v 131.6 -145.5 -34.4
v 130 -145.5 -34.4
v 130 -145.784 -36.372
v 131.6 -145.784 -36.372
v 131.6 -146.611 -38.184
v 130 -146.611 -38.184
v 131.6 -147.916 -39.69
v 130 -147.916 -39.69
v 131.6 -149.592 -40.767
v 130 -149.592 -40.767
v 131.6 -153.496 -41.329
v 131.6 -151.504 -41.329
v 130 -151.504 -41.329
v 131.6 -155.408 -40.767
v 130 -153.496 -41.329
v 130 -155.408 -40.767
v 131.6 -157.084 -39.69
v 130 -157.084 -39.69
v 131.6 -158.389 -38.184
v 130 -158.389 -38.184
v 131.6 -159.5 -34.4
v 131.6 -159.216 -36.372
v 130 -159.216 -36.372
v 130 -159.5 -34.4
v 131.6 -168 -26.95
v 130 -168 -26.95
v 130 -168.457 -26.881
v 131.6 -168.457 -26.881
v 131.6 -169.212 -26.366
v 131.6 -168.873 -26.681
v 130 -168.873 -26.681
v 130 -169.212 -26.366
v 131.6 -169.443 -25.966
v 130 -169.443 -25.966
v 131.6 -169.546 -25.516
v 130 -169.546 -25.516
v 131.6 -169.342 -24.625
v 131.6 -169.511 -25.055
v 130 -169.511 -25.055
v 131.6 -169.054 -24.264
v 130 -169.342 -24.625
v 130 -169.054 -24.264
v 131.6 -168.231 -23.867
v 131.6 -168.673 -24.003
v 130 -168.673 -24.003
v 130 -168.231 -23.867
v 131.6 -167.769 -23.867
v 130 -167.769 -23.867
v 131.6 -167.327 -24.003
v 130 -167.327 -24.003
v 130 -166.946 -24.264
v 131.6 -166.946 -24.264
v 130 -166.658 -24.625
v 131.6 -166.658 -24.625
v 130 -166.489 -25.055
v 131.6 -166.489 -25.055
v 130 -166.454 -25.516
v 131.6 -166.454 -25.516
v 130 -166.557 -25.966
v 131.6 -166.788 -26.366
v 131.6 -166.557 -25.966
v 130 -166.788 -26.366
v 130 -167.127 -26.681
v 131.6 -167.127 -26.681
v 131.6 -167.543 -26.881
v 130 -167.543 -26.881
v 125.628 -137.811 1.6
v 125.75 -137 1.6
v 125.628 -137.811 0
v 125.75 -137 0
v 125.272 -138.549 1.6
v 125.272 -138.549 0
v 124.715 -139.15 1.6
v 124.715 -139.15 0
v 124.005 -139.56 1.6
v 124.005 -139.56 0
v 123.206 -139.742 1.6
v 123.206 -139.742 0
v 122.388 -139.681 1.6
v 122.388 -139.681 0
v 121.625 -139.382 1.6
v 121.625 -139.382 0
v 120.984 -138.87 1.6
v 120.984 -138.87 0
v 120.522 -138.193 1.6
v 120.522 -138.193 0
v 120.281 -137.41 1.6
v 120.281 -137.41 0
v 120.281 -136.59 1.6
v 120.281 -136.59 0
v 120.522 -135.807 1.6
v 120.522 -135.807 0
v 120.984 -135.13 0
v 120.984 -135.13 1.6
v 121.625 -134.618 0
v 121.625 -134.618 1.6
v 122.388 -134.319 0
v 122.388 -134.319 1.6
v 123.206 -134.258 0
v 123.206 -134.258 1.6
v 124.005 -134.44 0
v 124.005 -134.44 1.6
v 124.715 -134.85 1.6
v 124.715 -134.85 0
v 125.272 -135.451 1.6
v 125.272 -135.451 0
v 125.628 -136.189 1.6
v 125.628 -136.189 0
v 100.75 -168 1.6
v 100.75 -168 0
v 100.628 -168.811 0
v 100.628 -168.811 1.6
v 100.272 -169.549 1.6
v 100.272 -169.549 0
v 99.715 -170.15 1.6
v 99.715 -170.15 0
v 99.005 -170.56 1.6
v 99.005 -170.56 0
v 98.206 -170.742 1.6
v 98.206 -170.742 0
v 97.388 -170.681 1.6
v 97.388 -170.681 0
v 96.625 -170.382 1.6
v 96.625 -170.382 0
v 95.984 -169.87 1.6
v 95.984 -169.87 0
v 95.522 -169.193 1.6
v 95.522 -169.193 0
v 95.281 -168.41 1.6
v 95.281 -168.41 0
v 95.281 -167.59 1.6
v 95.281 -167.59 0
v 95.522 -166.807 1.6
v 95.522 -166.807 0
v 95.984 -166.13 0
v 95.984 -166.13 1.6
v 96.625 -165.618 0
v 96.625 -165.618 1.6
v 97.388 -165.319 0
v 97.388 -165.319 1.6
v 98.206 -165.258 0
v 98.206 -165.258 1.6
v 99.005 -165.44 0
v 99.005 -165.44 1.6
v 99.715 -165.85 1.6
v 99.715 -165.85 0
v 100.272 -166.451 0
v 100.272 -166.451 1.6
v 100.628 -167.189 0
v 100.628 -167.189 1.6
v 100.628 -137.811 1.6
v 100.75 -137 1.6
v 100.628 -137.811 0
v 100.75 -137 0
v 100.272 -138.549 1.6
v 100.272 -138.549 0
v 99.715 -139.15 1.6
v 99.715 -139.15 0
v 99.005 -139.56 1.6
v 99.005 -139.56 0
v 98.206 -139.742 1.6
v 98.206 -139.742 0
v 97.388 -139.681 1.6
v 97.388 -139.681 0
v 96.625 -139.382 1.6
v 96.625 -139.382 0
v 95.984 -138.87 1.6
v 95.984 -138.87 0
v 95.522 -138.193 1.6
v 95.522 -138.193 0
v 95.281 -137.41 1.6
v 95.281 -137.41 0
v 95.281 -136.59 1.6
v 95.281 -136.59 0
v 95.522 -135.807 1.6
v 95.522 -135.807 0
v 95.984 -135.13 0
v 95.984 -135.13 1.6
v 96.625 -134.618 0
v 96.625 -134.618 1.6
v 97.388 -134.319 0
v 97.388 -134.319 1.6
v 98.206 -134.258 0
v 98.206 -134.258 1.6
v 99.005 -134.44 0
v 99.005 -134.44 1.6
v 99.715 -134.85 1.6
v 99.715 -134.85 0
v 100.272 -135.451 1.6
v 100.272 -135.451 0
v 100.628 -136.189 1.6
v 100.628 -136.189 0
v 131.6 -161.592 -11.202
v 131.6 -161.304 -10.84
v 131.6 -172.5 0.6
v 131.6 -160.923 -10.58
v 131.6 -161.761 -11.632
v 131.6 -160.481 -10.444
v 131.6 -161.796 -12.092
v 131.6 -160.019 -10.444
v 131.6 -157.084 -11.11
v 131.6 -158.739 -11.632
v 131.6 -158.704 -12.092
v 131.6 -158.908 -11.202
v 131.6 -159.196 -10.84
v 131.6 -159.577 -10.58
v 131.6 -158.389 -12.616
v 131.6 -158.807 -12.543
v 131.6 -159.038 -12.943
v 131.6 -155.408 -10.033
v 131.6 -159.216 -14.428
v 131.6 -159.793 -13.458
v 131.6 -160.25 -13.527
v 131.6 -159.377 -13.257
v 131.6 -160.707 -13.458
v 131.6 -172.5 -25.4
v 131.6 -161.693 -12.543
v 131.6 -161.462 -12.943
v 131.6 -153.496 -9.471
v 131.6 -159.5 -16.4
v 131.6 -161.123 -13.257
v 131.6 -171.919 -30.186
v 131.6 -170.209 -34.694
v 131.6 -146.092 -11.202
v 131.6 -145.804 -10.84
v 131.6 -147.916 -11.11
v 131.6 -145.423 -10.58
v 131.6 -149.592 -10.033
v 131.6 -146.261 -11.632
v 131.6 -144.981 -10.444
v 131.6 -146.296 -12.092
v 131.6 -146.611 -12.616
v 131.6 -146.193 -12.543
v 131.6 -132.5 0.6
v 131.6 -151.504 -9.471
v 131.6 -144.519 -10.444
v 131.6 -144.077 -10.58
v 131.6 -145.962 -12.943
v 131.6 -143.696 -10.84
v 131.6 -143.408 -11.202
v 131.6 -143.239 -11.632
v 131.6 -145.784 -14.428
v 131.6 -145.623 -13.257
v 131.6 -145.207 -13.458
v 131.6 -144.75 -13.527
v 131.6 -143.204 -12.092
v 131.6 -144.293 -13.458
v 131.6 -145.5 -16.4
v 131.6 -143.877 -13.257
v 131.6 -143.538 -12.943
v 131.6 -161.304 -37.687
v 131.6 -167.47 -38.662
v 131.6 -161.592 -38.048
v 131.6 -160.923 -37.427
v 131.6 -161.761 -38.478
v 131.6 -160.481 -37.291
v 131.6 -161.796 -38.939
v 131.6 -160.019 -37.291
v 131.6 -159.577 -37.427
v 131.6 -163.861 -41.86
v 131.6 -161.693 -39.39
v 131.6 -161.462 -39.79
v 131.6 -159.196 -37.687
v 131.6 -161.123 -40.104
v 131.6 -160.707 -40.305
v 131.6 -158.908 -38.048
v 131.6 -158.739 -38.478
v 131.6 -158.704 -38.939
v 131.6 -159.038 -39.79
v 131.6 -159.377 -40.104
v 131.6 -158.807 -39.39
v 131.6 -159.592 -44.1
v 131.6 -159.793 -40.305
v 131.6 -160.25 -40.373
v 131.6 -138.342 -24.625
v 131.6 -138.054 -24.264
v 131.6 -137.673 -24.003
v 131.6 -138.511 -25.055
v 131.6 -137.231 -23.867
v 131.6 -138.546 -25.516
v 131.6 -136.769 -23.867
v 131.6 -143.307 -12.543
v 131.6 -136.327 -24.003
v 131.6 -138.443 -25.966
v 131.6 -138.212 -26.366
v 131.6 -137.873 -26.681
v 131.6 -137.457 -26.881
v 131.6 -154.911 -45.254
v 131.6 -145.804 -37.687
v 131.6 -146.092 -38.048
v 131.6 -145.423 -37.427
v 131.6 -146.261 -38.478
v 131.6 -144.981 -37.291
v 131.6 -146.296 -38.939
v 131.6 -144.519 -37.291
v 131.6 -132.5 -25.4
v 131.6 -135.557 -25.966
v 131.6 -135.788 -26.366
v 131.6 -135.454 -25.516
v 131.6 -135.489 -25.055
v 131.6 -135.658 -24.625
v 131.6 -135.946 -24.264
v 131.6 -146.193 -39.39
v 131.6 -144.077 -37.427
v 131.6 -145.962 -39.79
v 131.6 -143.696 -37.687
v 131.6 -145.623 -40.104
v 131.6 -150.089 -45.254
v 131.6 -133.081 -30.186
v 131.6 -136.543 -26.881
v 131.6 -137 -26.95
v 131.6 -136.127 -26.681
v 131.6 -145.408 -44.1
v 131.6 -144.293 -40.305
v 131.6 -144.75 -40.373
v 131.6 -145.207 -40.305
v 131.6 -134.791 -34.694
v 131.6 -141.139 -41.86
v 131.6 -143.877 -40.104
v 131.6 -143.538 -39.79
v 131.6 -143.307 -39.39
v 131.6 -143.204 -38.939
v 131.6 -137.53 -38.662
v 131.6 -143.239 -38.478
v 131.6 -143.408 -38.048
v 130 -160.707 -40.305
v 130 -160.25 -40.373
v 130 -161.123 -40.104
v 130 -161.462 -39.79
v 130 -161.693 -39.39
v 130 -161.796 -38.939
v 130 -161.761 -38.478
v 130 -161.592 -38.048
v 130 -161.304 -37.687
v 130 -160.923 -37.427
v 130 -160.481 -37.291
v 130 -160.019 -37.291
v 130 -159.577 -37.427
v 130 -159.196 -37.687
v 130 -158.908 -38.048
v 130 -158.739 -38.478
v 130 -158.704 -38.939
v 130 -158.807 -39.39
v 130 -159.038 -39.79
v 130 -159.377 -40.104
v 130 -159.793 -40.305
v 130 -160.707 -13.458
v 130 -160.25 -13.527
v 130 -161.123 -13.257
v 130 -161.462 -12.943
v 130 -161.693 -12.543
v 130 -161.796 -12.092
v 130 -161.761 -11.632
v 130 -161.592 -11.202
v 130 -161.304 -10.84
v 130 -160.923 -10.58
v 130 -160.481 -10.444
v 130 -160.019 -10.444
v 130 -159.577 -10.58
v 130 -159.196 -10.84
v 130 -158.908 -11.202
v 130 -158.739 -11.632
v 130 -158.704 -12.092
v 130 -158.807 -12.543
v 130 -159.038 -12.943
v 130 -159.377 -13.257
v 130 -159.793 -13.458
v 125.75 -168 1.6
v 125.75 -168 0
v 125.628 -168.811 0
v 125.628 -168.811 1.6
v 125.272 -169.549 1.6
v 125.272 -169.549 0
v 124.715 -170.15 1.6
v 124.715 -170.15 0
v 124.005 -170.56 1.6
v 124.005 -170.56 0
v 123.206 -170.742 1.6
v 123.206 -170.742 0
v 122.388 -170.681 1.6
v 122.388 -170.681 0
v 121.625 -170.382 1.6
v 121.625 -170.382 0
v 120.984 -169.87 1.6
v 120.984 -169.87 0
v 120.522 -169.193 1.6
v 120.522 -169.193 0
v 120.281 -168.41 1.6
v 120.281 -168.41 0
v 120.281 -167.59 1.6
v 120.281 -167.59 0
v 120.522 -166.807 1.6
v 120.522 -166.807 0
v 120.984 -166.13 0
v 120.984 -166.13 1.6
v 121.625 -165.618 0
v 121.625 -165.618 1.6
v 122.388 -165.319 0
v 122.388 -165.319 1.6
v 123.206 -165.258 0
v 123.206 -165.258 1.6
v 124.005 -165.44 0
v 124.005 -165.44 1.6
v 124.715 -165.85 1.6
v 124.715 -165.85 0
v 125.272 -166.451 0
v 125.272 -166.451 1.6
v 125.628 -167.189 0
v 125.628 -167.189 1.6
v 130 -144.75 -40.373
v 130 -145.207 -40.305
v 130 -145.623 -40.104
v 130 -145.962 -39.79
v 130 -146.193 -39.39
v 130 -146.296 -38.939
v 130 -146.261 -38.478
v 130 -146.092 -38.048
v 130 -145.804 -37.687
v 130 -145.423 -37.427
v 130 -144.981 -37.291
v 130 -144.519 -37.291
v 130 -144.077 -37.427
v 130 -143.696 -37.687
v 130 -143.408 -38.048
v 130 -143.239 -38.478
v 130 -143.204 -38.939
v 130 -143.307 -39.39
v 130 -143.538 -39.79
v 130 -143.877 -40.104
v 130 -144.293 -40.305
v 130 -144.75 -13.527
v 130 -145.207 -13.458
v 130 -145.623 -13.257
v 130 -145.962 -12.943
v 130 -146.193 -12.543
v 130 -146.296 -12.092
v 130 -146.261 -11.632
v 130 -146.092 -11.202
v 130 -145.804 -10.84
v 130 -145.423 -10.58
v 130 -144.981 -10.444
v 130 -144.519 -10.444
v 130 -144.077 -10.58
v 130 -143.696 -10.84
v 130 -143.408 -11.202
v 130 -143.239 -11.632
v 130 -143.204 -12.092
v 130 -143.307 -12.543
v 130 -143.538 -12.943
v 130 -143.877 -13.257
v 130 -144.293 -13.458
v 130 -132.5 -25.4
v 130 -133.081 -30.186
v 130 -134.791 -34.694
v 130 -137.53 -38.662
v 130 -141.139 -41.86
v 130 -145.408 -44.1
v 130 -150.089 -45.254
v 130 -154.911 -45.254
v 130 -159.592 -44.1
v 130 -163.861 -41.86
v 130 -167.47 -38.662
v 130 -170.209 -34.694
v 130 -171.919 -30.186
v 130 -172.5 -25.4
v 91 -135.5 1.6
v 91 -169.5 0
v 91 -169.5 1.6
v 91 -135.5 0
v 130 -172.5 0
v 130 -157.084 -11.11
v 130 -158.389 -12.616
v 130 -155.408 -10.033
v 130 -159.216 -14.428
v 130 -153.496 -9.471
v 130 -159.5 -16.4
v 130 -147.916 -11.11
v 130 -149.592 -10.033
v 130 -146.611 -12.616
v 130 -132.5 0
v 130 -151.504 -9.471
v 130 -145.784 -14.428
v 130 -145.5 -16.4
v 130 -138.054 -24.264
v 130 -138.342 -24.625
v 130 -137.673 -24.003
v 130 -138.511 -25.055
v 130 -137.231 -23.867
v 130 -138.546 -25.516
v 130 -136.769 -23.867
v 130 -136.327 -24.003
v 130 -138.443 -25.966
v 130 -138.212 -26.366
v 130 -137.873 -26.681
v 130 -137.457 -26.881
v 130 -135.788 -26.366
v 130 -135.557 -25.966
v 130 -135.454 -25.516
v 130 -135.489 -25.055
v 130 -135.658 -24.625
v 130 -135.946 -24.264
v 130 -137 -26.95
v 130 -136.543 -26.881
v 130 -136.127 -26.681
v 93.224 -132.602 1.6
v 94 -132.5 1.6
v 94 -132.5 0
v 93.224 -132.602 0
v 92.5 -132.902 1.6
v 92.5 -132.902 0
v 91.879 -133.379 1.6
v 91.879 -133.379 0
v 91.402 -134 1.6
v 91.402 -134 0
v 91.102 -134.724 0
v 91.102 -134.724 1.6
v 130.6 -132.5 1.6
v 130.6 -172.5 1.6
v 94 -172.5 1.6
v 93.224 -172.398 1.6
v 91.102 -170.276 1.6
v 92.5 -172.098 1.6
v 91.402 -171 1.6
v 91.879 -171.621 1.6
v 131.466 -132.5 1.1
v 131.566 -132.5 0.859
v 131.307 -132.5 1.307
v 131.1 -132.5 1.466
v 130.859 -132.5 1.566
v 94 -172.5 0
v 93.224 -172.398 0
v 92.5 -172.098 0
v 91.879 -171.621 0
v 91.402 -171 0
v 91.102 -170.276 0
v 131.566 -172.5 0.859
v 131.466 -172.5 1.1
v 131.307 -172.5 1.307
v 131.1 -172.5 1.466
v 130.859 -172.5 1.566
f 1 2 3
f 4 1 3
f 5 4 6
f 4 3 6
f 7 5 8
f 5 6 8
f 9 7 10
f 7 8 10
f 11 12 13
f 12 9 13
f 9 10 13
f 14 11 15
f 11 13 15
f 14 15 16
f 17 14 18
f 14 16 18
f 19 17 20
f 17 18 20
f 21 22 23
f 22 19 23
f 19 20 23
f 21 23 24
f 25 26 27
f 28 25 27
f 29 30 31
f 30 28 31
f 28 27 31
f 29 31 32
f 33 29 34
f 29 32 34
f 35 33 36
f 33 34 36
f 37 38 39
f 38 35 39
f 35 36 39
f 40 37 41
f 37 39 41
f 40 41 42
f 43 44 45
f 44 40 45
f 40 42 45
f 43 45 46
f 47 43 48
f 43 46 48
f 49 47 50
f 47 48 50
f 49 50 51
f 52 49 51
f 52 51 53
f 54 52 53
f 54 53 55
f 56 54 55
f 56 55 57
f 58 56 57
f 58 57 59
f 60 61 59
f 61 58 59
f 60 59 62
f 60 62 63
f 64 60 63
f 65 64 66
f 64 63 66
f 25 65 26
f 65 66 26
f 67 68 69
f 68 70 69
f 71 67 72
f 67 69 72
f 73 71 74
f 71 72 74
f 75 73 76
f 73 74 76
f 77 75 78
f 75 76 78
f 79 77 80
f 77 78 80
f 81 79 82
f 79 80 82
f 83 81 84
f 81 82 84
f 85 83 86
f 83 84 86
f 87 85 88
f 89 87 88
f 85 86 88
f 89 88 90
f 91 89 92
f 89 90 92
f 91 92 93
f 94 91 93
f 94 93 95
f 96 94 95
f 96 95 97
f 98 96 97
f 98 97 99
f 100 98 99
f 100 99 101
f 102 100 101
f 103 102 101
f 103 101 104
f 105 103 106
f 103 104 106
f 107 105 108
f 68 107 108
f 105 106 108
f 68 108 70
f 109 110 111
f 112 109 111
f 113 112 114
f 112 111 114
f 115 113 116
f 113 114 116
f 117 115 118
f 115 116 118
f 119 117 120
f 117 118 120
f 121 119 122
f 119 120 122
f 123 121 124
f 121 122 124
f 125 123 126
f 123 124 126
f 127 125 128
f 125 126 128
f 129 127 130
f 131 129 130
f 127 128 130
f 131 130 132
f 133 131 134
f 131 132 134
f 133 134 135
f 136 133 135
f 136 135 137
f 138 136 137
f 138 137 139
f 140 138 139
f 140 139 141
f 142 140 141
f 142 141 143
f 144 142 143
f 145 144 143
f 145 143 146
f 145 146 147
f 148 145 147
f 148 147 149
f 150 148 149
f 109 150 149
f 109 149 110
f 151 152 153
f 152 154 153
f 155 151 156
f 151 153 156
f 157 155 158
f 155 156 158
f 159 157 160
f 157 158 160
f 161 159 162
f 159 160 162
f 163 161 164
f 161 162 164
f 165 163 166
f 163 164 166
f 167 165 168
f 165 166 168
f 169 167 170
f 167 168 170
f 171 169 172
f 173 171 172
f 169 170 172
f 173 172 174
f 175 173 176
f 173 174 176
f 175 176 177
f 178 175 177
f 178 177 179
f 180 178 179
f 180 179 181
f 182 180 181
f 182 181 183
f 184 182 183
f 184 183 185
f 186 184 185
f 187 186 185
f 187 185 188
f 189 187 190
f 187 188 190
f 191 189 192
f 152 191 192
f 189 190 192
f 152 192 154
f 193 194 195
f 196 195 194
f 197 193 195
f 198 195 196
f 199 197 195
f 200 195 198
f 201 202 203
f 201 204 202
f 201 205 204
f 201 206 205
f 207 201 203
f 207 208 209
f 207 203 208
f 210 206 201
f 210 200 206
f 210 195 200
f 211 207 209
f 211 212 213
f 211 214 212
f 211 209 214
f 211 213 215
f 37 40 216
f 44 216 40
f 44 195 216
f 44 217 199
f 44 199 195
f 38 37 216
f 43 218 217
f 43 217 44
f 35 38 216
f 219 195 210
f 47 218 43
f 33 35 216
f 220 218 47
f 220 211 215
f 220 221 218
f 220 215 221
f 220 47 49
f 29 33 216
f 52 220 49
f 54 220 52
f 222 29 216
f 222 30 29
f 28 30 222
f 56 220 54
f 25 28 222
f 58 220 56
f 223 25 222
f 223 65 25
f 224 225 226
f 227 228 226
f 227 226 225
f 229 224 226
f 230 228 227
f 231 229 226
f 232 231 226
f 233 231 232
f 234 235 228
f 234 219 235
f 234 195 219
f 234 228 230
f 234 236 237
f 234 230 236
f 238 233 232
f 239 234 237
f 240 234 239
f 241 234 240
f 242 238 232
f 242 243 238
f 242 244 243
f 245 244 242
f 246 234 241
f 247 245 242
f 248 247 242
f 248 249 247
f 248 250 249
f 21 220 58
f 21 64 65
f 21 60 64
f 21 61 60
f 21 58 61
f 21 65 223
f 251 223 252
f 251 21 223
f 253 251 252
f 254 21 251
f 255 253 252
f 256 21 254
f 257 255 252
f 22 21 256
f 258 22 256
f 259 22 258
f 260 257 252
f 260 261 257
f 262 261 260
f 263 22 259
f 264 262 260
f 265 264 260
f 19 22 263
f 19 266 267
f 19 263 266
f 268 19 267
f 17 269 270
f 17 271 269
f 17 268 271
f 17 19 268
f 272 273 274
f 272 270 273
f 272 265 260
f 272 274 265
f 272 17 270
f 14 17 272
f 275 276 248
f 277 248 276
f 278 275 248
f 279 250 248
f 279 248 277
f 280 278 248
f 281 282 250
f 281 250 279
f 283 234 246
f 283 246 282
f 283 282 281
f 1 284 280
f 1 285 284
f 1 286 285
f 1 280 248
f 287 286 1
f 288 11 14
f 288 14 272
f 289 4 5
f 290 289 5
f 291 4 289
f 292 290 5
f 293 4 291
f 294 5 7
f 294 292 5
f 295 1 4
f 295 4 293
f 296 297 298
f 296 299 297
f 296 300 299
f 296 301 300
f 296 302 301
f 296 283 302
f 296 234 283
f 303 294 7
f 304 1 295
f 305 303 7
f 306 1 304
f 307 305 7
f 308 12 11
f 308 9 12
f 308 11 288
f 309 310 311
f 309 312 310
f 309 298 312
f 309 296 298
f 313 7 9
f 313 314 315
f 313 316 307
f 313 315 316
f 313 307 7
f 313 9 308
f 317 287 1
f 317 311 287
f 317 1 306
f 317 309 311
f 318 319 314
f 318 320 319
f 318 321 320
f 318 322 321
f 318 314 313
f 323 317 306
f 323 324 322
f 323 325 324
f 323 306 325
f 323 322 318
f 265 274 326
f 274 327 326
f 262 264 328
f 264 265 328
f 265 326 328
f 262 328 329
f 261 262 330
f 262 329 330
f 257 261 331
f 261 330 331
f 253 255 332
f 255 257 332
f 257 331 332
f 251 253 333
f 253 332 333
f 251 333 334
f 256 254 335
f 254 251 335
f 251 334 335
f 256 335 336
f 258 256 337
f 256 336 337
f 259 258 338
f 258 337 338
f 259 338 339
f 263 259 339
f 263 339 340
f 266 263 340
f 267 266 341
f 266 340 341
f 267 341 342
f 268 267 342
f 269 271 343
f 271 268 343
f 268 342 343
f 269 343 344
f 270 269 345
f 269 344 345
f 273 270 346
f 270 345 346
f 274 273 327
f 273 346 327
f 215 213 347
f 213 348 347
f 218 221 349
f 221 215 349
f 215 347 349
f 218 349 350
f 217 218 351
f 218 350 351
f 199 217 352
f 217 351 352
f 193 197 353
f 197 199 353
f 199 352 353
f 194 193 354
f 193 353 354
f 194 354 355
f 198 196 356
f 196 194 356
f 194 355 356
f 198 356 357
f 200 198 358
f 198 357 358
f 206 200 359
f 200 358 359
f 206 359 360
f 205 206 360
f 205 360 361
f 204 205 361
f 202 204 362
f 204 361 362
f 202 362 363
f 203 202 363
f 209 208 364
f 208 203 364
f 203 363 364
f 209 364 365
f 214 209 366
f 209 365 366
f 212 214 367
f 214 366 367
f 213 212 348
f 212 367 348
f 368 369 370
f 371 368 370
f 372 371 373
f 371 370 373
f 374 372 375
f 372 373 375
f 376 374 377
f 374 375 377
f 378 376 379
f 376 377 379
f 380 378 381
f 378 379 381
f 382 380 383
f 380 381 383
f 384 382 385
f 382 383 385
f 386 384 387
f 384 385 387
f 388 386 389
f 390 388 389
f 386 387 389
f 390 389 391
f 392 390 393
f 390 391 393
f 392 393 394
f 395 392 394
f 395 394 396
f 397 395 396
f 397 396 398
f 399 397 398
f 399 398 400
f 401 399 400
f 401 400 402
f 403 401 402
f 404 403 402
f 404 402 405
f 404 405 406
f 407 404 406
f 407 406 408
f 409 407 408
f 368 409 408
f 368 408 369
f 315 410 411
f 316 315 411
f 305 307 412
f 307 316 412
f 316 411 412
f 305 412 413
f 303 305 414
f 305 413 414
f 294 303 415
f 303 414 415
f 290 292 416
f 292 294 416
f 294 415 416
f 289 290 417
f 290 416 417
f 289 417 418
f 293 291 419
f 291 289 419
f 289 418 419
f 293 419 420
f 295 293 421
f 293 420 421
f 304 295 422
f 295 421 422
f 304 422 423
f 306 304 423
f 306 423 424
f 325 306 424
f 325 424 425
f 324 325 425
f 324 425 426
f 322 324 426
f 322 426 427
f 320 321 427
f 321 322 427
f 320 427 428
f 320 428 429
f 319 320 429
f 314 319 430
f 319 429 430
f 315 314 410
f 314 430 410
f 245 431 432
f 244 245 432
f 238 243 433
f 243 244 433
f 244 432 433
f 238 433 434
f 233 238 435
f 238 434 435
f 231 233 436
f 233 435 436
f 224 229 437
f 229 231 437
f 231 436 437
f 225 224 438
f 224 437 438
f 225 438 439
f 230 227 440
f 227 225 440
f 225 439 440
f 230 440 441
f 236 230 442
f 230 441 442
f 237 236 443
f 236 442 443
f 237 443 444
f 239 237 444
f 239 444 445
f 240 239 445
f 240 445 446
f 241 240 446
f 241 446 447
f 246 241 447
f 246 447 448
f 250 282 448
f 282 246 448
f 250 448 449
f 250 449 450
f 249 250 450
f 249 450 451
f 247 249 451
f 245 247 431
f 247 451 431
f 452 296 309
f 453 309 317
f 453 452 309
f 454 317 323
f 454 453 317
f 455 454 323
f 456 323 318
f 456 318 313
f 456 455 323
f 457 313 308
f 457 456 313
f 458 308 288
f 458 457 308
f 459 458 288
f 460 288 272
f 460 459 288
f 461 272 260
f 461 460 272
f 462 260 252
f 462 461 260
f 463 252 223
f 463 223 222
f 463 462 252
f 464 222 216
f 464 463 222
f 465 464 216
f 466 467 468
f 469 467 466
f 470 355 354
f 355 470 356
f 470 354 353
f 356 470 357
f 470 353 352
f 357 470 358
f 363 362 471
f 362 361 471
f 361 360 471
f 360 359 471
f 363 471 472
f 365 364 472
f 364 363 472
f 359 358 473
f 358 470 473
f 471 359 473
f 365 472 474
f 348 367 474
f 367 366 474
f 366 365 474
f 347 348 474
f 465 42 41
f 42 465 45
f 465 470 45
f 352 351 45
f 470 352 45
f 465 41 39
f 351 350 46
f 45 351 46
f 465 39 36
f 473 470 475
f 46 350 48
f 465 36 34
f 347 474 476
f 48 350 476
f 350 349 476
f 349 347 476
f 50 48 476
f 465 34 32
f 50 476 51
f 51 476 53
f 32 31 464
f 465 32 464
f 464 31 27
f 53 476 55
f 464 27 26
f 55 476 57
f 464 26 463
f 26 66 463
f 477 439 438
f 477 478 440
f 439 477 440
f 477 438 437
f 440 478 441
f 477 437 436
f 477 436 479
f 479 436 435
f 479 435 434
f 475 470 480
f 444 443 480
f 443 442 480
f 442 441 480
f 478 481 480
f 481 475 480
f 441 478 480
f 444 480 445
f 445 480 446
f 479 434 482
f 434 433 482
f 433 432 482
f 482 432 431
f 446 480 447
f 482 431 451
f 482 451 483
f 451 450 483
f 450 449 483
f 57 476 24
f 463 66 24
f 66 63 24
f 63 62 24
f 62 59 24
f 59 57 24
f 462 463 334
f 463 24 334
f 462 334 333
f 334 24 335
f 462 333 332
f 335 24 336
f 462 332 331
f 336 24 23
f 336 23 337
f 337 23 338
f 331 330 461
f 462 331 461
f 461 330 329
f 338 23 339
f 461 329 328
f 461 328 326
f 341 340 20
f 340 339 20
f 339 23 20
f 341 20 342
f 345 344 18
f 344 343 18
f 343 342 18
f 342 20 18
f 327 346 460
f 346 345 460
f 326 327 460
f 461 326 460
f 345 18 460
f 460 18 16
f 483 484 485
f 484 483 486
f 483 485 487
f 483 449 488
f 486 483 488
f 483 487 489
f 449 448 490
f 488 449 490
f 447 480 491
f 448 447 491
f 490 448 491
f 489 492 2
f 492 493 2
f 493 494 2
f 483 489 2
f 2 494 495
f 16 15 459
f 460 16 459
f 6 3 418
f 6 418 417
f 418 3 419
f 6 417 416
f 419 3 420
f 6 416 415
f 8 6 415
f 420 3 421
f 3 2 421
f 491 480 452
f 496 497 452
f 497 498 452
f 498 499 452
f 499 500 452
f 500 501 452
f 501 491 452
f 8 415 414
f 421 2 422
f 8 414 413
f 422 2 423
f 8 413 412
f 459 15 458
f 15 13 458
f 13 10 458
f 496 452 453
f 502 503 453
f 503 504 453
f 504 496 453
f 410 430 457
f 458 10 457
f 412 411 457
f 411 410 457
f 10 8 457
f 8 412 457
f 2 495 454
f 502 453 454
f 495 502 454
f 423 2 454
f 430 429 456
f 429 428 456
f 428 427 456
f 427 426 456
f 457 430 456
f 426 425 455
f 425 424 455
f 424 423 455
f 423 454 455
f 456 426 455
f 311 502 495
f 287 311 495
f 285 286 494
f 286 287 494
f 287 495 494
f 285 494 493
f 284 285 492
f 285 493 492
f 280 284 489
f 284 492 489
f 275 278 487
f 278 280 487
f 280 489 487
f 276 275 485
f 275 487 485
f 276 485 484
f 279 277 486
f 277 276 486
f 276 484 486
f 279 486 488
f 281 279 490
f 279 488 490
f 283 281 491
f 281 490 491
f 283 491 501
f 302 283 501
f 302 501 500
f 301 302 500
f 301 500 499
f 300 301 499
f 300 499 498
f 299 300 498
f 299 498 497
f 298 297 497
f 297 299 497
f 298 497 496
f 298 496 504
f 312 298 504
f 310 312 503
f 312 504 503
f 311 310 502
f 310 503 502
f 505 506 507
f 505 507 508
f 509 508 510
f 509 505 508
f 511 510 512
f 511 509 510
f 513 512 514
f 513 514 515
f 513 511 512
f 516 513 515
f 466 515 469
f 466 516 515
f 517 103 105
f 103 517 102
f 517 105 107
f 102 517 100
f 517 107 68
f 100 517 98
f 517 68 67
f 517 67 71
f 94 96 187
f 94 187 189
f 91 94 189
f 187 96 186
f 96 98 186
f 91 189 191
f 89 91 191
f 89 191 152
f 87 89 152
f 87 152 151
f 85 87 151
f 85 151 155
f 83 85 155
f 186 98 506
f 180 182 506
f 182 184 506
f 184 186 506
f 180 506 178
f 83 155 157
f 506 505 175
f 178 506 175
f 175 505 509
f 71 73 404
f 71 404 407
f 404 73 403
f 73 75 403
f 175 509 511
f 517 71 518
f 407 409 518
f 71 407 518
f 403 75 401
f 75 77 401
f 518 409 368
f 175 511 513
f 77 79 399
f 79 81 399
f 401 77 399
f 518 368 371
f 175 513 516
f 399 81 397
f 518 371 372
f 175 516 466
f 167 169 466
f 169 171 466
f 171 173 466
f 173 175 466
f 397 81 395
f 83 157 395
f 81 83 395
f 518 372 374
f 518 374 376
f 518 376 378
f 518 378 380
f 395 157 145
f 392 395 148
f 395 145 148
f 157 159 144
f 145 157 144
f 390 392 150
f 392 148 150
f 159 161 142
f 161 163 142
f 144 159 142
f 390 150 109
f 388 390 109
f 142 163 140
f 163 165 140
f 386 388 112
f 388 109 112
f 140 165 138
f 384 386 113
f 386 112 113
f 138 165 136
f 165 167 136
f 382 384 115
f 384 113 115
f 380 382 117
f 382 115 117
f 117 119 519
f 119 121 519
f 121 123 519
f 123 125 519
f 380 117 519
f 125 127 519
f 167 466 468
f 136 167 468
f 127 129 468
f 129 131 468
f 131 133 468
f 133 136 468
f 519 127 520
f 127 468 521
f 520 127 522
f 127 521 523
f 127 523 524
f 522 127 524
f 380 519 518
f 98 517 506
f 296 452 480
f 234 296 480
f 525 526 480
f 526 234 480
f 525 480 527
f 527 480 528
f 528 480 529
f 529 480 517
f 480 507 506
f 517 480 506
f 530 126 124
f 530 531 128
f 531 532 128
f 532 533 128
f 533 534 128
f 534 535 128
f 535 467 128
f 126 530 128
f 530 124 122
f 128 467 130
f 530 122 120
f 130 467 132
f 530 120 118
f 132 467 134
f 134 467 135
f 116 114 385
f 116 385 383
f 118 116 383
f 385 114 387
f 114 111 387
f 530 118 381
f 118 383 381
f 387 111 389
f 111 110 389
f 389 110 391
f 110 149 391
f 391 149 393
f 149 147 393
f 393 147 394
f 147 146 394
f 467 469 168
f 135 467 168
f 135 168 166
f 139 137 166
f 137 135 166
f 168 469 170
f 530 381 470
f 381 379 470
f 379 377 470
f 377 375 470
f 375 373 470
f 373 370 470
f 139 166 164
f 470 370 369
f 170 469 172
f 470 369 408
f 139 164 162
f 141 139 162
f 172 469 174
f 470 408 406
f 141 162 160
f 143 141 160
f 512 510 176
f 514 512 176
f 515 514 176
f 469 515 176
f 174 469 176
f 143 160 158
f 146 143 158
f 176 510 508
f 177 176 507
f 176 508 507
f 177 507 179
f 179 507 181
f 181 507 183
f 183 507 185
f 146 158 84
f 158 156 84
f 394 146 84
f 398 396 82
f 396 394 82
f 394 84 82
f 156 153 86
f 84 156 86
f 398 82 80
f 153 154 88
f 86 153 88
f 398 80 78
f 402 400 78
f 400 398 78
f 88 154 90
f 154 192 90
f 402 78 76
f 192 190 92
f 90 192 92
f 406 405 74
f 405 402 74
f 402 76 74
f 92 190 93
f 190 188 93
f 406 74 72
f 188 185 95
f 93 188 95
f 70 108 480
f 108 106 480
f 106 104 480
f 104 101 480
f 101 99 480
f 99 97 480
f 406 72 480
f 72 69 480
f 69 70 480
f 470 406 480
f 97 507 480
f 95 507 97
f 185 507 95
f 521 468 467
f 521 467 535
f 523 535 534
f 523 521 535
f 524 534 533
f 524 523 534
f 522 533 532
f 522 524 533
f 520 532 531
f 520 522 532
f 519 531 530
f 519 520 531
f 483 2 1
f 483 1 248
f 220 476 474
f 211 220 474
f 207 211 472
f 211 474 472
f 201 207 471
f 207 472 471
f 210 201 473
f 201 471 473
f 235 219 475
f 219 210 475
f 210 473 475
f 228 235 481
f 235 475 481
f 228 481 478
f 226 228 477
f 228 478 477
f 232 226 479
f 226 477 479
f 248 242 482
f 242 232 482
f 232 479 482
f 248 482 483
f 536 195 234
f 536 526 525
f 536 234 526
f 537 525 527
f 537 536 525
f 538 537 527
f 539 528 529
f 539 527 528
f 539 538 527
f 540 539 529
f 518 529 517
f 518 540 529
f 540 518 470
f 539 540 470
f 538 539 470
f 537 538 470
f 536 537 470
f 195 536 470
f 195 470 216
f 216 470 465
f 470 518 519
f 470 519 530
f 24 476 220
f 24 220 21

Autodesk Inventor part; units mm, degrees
ref_plane "YZ Plane" through (0, 0, 0) normal (1, 0, 0) x (0, 1, 0)
ref_plane "XZ Plane" through (0, 0, 0) normal (0, 1, 0) x (-1, 0, 0)
ref_plane "작업 평면1" through (0, 0, 0) normal (0, 0, 1) x (1, 0, 0)
sketch "스케치1" plane through (0, 0, 0) normal (0, 0, 1) x (1, 0, 0)
  line L0 (130, -172.5) -> (91, -172.5)
  line L1 (91, -172.5) -> (91, -132.5)
  line L2 (91, -132.5) -> (130, -132.5)
  line L3 (130, -132.5) -> (130, -172.5)
  line L4 (91, -152.5) -> (130, -152.5) construction
  circle A0 centre (98, -168) radius 2.75
  line L5 (110.5, -172.5) -> (110.5, -132.5) construction
  circle A1 centre (98, -137) radius 2.75
  circle A2 centre (123, -168) radius 2.75
  circle A3 centre (123, -137) radius 2.75
  circle A4 centre (0, 170) radius 2 projected
  circle A5 centre (-73.6122, 42.5) radius 2 projected
  circle A6 centre (73.6122, 42.5) radius 2 projected
  line L6 (-175, 220) -> (-175, 200) projected
  line L7 (-175, 200) -> (-130, 200) projected
  line L8 (-130, 200) -> (-130, 105) projected
  line L9 (-130, 105) -> (-175, 105) projected
  line L10 (-175, 105) -> (-175, -105) projected
  line L11 (-175, -105) -> (-130, -105) projected
  line L12 (-130, -105) -> (-130, -200) projected
  line L13 (-130, -200) -> (-175, -200) projected
  line L14 (-175, -200) -> (-175, -220) projected
  arc A7 (-175, -220) -> (-145, -250) centre (-145, -220) ccw projected
  line L15 (-145, -250) -> (145, -250) projected
  arc A8 (145, -250) -> (175, -220) centre (145, -220) ccw projected
  line L16 (175, -220) -> (175, -200) projected
  line L17 (175, -200) -> (130, -200) projected
  line L18 (130, -200) -> (130, -105) projected
  line L19 (130, -105) -> (175, -105) projected
  line L20 (175, -105) -> (175, 105) projected
  line L21 (175, 105) -> (130, 105) projected
  line L22 (130, 105) -> (130, 200) projected
  line L23 (130, 200) -> (175, 200) projected
  line L24 (175, 200) -> (175, 220) projected
  arc A9 (175, 220) -> (145, 250) centre (145, 220) ccw projected
  line L25 (145, 250) -> (-145, 250) projected
  arc A10 (-145, 250) -> (-175, 220) centre (-145, 220) ccw projected
  circle A11 centre (-123, 166.7672) radius 2 projected
  circle A12 centre (122.9975, 135.7594) radius 2 projected
  circle A13 centre (97.9975, -135.761) radius 2 projected
  circle A14 centre (15.5, 71.3) radius 2 projected
  circle A15 centre (165.0067, -210) radius 2.5 projected
  circle A16 centre (119.0003, -180.2596) radius 1.25 projected
  circle A17 centre (-119, -122.2672) radius 1.25 projected
  circle A18 centre (-123, -135.7672) radius 2 projected
  circle A19 centre (0.0196, 140) radius 2 projected
  circle A20 centre (-123, -166.7672) radius 2 projected
  circle A21 centre (-70, -122.2672) radius 1.25 projected
  circle A22 centre (69.9966, -122.2627) radius 1.25 projected
  circle A23 centre (-165, 0) radius 2.5 projected
  circle A24 centre (-165.0067, 210) radius 2.5 projected
  circle A25 centre (-15.5, 119.1) radius 2 projected
  circle A26 centre (97.9995, -166.761) radius 2 projected
  circle A27 centre (97.9995, 166.761) radius 2 projected
  circle A28 centre (-98, 166.7672) radius 2 projected
  circle A29 centre (-123, 135.7672) radius 2 projected
  circle A30 centre (97.9975, 135.761) radius 2 projected
  circle A31 centre (122.9975, -135.7594) radius 2 projected
  circle A32 centre (-15.5, 71.3) radius 2 projected
  circle A33 centre (-164.9933, -210) radius 2.5 projected
  circle A34 centre (70.0003, -180.2627) radius 1.25 projected
  circle A35 centre (-119, -180.2672) radius 1.25 projected
  circle A36 centre (-98, -135.7672) radius 2 projected
  circle A37 centre (47.6216, 57.483) radius 2 projected
  circle A38 centre (-47.6412, 57.517) radius 2 projected
  circle A39 centre (-98, -166.7672) radius 2 projected
  circle A40 centre (-70, -180.2672) radius 1.25 projected
  circle A41 centre (118.9966, -122.2596) radius 1.25 projected
  circle A42 centre (165, 0) radius 2.5 projected
  circle A43 centre (164.9933, 210) radius 2.5 projected
  circle A44 centre (15.5, 119.1) radius 2 projected
  circle A45 centre (122.9995, -166.7594) radius 2 projected
  circle A46 centre (122.9995, 166.7594) radius 2 projected
  circle A47 centre (-98, 135.7672) radius 2 projected
  line L26 (-110, 97.5) -> (-93, 97.5) projected
  line L27 (-93, 97.5) -> (-93, 89.5) projected
  line L28 (-93, 89.5) -> (-110, 89.5) projected
  line L29 (-110, 89.5) -> (-110, 97.5) projected
  circle A48 centre (148, -23.75) radius 2 projected
  circle A49 centre (130.626, -27.584) radius 1.5 projected
  circle A50 centre (118.5, 61.5) radius 1.5 projected
  circle A51 centre (-118.5, 61.5) radius 1.5 projected
  circle A52 centre (21, -158.9548) radius 2 projected
  circle A53 centre (-22, -53) radius 2 projected
  circle A54 centre (-49.5, -194.9548) radius 2 projected
  circle A55 centre (-49.5, -158.9548) radius 2 projected
  circle A56 centre (21, -194.9548) radius 2 projected
  circle A57 centre (-155, 25) radius 1.5 projected
  circle A58 centre (118.5, 25) radius 1.5 projected
  circle A59 centre (123.133, -76) radius 1.5 projected
  circle A60 centre (37, -84) radius 2 projected
  line L30 (-93, -89.5) -> (-93, -97.5) projected
  line L31 (-93, -97.5) -> (-110, -97.5) projected
  line L32 (-110, -97.5) -> (-110, -89.5) projected
  line L33 (-110, -89.5) -> (-93, -89.5) projected
  circle A61 centre (-130, 5) radius 6 projected
  line L34 (110, 89.5) -> (93, 89.5) projected
  line L35 (93, 89.5) -> (93, 97.5) projected
  line L36 (93, 97.5) -> (110, 97.5) projected
  line L37 (110, 97.5) -> (110, 89.5) projected
  circle A62 centre (148, -84) radius 2 projected
  circle A63 centre (47.999, -27.584) radius 1.5 projected
  circle A64 centre (155, 61.5) radius 1.5 projected
  circle A65 centre (-155, 61.5) radius 1.5 projected
  circle A66 centre (49.5, -158.9548) radius 2 projected
  circle A67 centre (-86, -93.5) radius 2 projected
  circle A68 centre (-21, -194.9548) radius 2 projected
  circle A69 centre (-150, -53) radius 2 projected
  circle A70 centre (-21, -158.9548) radius 2 projected
  circle A71 centre (49.5, -194.9548) radius 2 projected
  circle A72 centre (-118.5, 25) radius 1.5 projected
  circle A73 centre (155, 25) radius 1.5 projected
  circle A74 centre (48, -76) radius 1.5 projected
  circle A75 centre (37, -23.75) radius 2 projected
  line L38 (110, -89.5) -> (110, -97.5) projected
  line L39 (110, -97.5) -> (93, -97.5) projected
  line L40 (93, -97.5) -> (93, -89.5) projected
  line L41 (93, -89.5) -> (110, -89.5) projected
  circle A76 centre (-70, 5) radius 6 projected
  circle A77 centre (0, -216.4634) radius 1.5 projected
  circle A78 centre (28.4775, -136.4634) radius 1.5 projected
  circle A79 centre (-28.4775, -136.4634) radius 1.5 projected
  point P0 (0, 0)
  dimension "d0" = 40
  dimension "d1" = 39
  dimension "d5" = 5.5
  dimension "d6" = 7
  dimension "d7" = 4.5
  dimension "d22" = 97.5
extrude "돌출1" add sketch "스케치1" along normal blind 1.6 contours L0 L1 L2 L3 | A0 A26 | A1 A13 | A2 A45 | A3 A31 picked at (98.3703, -165.1311) picked at (98.3657, -134.1305) picked at (122.627, -165.1309) picked at (123.3661, -134.13)
sketch "스케치2" plane through (130, -172.5, 0) normal (1, 0, 0) x (0, 0, -1)
  line L0 (0, 40) -> (-1.6, 40)
  line L1 (-1.6, 0) -> (25.4, 0)
  line L2 (45.4, 20) -> (45.4, 20)
  line L3 (25.4, 40) -> (-1.6, 40)
  line L4 (-1.6, 40) -> (-1.6, 0)
  arc A0 (25.4, 0) -> (45.4, 20) centre (25.4, 20) ccw
  arc A1 (45.4, 20) -> (25.4, 40) centre (25.4, 20) ccw
  circle A2 centre (25.4, 35.5) radius 1.55
  circle A3 centre (11.9766, 27.75) radius 1.55
  circle A4 centre (11.9766, 12.25) radius 1.55
  circle A5 centre (25.4, 4.5) radius 1.55
  circle A6 centre (38.8234, 12.25) radius 1.55
  circle A7 centre (38.8234, 27.75) radius 1.55
  line L5 (34.4, 20) -> (16.4, 20) construction
  line L6 (34.4, 27) -> (16.4, 27)
  line L7 (16.4, 13) -> (34.4, 13)
  arc A8 (34.4, 13) -> (34.4, 27) centre (34.4, 20) ccw
  arc A9 (16.4, 27) -> (16.4, 13) centre (16.4, 20) ccw
  line L8 (0, 40) -> (-1.6, 40) projected
  point P0 (0, 172.5)
  point P1 (45.4, 40)
  point P2 (45.4, 20)
  point P3 (-1.6, 40)
  point P4 (0, 40)
  dimension "d3" = 1.6
  dimension "d8" = 47
  dimension "d9" = 20
  dimension "d10" = 3.1
  dimension "d11" = 15.5
  dimension "d14" = 360
  dimension "d16" = 9
  dimension "d17" = 14
extrude "돌출2" add sketch "스케치2" along normal blind 1.6
fillet "모깎기1" radius 3 2 edges at (91, -132.5, 0.8) (91, -172.5, 0.8)
fillet "모깎기2" radius 1 1 edges at (131.6, -152.5, 1.6)
properties part number "SAFRS-P-0038"
